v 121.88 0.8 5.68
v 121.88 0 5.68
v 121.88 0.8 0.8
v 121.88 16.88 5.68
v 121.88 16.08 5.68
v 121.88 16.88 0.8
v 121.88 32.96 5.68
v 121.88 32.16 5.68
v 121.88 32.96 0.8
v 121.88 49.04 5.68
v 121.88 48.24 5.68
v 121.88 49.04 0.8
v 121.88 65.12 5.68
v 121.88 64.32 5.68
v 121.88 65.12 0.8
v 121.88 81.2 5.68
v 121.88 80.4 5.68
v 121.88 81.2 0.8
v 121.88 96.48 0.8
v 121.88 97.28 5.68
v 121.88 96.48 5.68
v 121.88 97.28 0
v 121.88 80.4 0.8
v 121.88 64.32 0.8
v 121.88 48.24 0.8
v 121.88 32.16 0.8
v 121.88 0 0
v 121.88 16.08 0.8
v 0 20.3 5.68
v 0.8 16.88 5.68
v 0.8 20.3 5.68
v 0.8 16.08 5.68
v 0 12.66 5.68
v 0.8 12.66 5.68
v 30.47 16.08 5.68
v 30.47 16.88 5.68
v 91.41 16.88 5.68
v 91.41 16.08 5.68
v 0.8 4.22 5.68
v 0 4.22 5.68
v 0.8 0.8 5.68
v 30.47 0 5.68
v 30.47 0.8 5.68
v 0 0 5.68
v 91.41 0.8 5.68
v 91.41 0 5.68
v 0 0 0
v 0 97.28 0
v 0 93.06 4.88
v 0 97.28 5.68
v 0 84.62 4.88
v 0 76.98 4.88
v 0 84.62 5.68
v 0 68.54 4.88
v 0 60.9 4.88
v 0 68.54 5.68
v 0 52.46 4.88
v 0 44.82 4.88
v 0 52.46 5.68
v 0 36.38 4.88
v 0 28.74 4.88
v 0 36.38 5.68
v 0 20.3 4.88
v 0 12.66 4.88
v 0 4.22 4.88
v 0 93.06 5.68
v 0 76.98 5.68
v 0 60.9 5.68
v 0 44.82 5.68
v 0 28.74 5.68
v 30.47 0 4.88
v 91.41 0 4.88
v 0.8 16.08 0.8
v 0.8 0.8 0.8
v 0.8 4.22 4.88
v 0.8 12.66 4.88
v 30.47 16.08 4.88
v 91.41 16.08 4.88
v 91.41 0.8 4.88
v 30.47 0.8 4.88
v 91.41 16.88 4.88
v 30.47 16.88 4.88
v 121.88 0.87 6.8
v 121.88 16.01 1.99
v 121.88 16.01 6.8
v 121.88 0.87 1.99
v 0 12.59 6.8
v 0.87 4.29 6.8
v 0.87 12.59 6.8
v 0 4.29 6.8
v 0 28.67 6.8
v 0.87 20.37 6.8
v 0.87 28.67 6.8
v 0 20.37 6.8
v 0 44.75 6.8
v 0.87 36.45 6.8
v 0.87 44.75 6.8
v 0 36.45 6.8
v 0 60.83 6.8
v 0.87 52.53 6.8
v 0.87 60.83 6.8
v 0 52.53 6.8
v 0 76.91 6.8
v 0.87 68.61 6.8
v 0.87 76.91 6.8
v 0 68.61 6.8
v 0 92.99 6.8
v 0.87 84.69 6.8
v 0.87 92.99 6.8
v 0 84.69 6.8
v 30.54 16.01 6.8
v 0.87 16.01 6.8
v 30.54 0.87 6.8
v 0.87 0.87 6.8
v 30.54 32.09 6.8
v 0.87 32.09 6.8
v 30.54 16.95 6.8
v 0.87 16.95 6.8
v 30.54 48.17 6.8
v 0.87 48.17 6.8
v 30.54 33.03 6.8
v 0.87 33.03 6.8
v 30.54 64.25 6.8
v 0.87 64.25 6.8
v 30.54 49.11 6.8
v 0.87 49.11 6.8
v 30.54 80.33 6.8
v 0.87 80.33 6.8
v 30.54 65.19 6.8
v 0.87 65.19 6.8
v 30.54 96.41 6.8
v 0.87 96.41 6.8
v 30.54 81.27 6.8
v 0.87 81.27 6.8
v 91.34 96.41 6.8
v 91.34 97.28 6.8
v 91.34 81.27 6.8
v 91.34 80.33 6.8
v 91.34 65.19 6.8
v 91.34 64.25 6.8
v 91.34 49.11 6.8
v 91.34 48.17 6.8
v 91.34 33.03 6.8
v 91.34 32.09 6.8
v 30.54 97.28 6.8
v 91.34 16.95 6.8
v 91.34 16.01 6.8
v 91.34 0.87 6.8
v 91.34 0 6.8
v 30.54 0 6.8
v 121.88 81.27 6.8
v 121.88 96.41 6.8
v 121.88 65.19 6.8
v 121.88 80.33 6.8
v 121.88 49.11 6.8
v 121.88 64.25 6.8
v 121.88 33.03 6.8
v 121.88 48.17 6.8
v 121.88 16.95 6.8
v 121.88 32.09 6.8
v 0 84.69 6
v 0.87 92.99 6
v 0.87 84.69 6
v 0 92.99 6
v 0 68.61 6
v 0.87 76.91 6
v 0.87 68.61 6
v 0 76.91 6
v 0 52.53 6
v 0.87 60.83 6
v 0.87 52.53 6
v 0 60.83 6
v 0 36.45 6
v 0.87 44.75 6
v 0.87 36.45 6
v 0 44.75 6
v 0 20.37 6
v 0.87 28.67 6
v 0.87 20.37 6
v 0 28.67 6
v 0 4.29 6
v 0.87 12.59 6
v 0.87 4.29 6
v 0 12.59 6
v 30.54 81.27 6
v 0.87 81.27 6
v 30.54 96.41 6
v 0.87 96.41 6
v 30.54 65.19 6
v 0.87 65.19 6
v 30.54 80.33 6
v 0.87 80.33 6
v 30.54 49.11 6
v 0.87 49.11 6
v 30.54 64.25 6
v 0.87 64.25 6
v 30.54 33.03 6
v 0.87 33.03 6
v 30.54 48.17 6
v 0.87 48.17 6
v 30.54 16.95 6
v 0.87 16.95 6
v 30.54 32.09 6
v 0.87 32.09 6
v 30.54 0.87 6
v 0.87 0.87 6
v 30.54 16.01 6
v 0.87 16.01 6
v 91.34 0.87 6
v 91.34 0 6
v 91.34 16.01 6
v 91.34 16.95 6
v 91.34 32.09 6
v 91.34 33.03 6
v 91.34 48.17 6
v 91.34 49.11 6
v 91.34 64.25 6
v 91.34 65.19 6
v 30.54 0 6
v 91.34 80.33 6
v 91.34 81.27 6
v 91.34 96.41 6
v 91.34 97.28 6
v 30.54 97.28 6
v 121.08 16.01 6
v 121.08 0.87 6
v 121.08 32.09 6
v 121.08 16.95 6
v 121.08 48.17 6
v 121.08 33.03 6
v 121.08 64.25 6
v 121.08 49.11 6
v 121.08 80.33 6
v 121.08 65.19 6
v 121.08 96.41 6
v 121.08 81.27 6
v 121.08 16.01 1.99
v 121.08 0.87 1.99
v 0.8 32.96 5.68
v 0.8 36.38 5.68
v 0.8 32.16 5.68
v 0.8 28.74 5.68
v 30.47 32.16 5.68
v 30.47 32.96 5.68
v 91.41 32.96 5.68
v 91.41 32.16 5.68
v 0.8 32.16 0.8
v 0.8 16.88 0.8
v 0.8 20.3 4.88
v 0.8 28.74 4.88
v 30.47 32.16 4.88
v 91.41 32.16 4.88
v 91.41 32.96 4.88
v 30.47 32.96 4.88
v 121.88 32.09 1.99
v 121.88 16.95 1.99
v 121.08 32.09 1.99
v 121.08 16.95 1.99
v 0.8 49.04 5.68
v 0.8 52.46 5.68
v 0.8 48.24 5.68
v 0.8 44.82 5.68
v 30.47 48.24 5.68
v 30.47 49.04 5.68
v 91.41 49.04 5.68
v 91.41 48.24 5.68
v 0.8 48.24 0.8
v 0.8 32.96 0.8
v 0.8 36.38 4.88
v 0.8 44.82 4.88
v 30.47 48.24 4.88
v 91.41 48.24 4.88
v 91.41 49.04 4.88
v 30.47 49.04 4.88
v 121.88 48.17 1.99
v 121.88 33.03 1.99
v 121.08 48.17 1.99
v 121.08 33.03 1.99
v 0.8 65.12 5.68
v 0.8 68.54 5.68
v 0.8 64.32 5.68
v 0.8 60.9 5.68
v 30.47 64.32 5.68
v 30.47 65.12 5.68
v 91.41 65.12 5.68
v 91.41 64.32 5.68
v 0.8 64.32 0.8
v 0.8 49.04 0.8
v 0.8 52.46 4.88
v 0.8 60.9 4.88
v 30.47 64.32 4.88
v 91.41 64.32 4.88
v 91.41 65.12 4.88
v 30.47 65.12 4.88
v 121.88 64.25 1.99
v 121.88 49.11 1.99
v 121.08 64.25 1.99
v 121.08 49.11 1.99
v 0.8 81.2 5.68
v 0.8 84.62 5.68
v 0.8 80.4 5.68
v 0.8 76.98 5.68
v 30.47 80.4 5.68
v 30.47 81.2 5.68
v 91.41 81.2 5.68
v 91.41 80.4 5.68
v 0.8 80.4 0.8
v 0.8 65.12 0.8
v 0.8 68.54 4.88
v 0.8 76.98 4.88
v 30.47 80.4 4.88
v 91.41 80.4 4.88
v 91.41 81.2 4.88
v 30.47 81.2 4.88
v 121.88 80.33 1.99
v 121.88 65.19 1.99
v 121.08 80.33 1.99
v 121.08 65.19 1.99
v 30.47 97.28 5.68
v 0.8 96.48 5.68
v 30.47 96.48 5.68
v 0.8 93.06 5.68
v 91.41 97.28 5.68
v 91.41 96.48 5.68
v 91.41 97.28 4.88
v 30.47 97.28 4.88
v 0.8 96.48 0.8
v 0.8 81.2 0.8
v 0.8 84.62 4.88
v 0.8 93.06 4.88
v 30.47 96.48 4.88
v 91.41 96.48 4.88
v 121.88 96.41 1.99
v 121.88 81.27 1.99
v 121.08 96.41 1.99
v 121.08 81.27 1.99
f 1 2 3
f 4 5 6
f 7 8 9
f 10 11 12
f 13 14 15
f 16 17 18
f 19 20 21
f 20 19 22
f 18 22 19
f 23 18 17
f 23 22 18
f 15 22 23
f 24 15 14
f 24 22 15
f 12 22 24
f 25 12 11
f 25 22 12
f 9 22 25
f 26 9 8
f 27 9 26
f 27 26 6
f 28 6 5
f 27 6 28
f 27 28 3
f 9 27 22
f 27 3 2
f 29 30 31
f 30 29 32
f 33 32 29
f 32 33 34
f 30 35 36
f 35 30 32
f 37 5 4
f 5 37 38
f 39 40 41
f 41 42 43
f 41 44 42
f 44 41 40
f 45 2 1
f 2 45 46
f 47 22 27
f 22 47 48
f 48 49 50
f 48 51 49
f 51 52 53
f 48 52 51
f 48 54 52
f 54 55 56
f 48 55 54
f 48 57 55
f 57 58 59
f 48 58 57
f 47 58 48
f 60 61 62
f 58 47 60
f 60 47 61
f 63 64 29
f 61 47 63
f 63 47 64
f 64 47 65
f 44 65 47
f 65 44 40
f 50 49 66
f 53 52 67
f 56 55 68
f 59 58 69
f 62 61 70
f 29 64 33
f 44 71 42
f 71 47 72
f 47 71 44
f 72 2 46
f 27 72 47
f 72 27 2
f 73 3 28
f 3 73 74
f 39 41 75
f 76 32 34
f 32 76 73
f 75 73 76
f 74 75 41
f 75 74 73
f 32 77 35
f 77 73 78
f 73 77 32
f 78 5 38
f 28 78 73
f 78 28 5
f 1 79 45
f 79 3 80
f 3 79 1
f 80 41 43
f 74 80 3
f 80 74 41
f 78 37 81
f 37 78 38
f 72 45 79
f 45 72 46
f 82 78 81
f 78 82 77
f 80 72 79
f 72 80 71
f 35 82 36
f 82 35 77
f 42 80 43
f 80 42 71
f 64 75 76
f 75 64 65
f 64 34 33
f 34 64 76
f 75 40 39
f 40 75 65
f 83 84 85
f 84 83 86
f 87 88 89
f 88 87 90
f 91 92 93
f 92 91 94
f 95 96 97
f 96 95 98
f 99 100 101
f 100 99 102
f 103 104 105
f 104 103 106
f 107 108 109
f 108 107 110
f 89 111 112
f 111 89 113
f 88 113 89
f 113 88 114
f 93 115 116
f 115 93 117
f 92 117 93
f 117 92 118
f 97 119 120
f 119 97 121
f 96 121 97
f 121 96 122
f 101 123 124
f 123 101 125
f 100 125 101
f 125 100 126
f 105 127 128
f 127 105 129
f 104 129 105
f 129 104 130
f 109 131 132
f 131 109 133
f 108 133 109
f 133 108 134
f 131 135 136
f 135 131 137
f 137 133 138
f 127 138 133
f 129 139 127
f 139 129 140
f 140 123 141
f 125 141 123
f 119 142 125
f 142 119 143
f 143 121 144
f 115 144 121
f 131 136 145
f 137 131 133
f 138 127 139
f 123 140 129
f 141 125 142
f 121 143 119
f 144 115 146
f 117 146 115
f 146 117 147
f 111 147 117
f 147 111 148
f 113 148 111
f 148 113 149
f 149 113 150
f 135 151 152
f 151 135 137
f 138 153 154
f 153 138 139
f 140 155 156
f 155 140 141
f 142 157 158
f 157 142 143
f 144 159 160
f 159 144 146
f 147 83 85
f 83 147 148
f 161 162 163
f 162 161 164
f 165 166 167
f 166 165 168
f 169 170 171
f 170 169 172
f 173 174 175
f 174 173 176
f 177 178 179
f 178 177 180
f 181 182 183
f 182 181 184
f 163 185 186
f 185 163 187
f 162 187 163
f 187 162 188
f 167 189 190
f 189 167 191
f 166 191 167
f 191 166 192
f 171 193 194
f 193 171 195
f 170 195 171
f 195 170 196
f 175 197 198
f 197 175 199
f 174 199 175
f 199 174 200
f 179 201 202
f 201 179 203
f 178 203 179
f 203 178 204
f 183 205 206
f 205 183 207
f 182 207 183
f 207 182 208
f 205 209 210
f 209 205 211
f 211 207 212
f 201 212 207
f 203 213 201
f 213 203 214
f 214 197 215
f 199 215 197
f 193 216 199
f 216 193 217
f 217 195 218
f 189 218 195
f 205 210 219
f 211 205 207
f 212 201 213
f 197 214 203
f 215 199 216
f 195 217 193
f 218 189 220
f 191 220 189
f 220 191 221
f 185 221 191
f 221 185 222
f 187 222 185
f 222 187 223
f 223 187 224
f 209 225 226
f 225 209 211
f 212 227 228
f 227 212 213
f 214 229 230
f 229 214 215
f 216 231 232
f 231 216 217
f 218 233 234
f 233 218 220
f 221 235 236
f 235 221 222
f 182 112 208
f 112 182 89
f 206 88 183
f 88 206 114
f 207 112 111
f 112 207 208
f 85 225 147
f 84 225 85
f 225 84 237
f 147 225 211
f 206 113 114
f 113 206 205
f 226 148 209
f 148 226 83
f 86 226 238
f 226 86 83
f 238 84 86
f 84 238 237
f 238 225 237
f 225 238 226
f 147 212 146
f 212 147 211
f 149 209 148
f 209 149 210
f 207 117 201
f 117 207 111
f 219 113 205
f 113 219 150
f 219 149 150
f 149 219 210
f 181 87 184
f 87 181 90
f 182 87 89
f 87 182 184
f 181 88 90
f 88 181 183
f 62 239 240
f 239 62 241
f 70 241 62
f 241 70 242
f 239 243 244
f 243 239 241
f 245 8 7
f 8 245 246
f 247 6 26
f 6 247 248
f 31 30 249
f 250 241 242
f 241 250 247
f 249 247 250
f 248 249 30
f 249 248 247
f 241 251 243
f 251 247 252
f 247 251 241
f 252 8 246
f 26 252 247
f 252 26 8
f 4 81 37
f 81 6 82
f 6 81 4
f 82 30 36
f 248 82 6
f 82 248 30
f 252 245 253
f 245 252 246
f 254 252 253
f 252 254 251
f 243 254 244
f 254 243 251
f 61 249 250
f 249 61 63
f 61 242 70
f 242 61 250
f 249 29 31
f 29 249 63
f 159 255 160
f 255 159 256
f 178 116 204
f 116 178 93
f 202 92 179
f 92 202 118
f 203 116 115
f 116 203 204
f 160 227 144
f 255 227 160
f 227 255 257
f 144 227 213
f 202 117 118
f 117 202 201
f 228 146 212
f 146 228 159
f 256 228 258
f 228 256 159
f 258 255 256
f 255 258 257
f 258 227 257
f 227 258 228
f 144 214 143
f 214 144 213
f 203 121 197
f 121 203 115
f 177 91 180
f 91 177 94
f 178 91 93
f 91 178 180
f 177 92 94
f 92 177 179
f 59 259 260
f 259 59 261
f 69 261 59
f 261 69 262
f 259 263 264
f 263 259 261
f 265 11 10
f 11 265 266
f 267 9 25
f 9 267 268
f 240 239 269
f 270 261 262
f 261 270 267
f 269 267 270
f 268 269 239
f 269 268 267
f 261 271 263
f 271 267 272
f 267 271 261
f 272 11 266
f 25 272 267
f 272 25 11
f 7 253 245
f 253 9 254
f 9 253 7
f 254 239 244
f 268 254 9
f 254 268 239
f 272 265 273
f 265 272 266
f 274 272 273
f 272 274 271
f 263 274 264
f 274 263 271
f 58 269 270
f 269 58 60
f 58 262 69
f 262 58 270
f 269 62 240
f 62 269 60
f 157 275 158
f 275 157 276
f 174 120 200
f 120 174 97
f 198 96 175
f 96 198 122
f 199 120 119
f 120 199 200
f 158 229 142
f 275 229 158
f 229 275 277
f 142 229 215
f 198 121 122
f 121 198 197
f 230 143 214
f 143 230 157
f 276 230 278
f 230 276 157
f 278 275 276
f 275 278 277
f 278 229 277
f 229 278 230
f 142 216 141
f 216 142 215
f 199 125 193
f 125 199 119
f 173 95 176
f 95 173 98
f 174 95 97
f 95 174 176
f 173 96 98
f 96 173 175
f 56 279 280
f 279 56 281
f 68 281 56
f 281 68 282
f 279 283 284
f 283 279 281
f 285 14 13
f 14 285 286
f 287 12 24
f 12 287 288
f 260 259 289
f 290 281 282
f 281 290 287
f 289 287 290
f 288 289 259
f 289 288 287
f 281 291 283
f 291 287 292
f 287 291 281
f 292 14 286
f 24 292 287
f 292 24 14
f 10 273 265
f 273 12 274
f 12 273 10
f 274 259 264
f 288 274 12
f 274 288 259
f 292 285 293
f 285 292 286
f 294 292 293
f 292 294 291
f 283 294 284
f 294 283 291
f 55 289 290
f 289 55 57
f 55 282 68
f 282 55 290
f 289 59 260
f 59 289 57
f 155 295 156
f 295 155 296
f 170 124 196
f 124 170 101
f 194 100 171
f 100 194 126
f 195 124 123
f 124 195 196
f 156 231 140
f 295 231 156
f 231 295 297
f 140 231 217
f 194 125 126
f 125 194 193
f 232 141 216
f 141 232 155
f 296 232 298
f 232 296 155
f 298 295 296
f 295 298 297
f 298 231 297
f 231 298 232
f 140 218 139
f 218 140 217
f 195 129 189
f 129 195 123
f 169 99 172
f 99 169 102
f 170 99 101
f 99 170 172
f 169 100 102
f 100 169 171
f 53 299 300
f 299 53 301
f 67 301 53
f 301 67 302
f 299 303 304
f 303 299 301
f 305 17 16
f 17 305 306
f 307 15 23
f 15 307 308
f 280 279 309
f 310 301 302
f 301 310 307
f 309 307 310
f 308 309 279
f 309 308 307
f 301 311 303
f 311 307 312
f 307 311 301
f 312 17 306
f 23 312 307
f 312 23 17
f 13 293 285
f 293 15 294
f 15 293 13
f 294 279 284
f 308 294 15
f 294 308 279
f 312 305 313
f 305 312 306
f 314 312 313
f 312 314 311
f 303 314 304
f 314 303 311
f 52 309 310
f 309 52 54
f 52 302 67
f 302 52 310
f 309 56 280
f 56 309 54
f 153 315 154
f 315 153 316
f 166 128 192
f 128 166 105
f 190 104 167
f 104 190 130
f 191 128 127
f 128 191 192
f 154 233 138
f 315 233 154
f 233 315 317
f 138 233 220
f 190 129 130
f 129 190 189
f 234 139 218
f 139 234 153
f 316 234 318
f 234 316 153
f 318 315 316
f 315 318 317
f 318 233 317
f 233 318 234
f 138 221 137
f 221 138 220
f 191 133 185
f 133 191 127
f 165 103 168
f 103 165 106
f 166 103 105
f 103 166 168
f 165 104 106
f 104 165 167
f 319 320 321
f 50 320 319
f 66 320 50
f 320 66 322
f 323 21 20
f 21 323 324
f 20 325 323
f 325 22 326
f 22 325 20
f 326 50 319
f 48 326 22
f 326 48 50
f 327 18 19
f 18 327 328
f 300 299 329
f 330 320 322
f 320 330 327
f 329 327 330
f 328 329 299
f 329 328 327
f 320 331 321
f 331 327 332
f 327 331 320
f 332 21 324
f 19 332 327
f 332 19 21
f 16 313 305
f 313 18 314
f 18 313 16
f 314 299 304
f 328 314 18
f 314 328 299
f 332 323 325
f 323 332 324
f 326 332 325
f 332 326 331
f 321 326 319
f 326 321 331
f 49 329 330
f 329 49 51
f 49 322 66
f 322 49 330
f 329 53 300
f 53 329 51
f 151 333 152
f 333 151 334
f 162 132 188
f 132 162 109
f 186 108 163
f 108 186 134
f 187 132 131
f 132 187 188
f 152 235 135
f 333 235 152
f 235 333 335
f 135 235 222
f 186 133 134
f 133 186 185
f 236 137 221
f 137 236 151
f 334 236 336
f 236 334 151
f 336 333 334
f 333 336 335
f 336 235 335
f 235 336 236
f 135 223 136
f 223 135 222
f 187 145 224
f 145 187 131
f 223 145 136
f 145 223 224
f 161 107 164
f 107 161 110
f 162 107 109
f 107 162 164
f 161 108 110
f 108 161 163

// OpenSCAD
walls = 2;
layer_width = 0.4;

thickness = walls * layer_width;
clearance = 0.07;
loose_clearance = 0.14;

monster_token_d = 15;
monster_token_h = 3;
monster_token_n = 8;
monster_token_outside_box = [
  monster_token_d * monster_token_n + loose_clearance * 2 + thickness * 2,
  monster_token_d + loose_clearance * 2 + thickness * 2,
  monster_token_h + loose_clearance * 2 + thickness * 3
];

module monster_token_box() {
  inside_box = [
    monster_token_d * monster_token_n + loose_clearance * 2 + thickness + 1,
    monster_token_d + loose_clearance * 2,
    monster_token_h + loose_clearance * 2 + thickness + 1
  ];
  
  difference() {
    cube(monster_token_outside_box);
    translate([thickness, thickness, thickness])
      cube(inside_box);
    translate([monster_token_outside_box[0] / 4, -1, monster_token_outside_box[2] - thickness])
      cube([monster_token_outside_box[0] / 2, monster_token_outside_box[1] + 2, thickness + 1]);
    translate([-1, monster_token_outside_box[1] / 4, monster_token_outside_box[2] - thickness])
      cube([thickness + 2, monster_token_outside_box[1] / 2, thickness + 1]);
  }
}

module monster_token_lid() {
  outside_box = [
    monster_token_outside_box[0] - thickness - clearance,
    monster_token_outside_box[1] - thickness * 2 - clearance * 2,
    thickness
  ];
  depth = monster_token_h + loose_clearance * 2 + thickness * 2 - thickness - clearance;
  translate([thickness + clearance, thickness + clearance, 0]) {
    cube(outside_box);
    translate([outside_box[0] - thickness, 0, -depth])
      cube([outside_box[2], outside_box[1], depth]);
  }
  
  translate([monster_token_outside_box[0] / 4 + clearance, 0, outside_box[2] - thickness])
    cube([monster_token_outside_box[0] / 2 - clearance * 2, monster_token_outside_box[1], thickness]);
  translate([0, monster_token_outside_box[1] / 4 + clearance, 0])
      cube([outside_box[0], monster_token_outside_box[1] / 2 - clearance * 2, thickness]);
}

//monster_token_box();
//translate([0, 0, 6])
//  monster_token_lid();

for (i = [0:5]) {
  translate([0, (monster_token_outside_box[1] - thickness) * i, 0]) {
    monster_token_box();
    translate([0, 0, 6])
      monster_token_lid();
  }
}
